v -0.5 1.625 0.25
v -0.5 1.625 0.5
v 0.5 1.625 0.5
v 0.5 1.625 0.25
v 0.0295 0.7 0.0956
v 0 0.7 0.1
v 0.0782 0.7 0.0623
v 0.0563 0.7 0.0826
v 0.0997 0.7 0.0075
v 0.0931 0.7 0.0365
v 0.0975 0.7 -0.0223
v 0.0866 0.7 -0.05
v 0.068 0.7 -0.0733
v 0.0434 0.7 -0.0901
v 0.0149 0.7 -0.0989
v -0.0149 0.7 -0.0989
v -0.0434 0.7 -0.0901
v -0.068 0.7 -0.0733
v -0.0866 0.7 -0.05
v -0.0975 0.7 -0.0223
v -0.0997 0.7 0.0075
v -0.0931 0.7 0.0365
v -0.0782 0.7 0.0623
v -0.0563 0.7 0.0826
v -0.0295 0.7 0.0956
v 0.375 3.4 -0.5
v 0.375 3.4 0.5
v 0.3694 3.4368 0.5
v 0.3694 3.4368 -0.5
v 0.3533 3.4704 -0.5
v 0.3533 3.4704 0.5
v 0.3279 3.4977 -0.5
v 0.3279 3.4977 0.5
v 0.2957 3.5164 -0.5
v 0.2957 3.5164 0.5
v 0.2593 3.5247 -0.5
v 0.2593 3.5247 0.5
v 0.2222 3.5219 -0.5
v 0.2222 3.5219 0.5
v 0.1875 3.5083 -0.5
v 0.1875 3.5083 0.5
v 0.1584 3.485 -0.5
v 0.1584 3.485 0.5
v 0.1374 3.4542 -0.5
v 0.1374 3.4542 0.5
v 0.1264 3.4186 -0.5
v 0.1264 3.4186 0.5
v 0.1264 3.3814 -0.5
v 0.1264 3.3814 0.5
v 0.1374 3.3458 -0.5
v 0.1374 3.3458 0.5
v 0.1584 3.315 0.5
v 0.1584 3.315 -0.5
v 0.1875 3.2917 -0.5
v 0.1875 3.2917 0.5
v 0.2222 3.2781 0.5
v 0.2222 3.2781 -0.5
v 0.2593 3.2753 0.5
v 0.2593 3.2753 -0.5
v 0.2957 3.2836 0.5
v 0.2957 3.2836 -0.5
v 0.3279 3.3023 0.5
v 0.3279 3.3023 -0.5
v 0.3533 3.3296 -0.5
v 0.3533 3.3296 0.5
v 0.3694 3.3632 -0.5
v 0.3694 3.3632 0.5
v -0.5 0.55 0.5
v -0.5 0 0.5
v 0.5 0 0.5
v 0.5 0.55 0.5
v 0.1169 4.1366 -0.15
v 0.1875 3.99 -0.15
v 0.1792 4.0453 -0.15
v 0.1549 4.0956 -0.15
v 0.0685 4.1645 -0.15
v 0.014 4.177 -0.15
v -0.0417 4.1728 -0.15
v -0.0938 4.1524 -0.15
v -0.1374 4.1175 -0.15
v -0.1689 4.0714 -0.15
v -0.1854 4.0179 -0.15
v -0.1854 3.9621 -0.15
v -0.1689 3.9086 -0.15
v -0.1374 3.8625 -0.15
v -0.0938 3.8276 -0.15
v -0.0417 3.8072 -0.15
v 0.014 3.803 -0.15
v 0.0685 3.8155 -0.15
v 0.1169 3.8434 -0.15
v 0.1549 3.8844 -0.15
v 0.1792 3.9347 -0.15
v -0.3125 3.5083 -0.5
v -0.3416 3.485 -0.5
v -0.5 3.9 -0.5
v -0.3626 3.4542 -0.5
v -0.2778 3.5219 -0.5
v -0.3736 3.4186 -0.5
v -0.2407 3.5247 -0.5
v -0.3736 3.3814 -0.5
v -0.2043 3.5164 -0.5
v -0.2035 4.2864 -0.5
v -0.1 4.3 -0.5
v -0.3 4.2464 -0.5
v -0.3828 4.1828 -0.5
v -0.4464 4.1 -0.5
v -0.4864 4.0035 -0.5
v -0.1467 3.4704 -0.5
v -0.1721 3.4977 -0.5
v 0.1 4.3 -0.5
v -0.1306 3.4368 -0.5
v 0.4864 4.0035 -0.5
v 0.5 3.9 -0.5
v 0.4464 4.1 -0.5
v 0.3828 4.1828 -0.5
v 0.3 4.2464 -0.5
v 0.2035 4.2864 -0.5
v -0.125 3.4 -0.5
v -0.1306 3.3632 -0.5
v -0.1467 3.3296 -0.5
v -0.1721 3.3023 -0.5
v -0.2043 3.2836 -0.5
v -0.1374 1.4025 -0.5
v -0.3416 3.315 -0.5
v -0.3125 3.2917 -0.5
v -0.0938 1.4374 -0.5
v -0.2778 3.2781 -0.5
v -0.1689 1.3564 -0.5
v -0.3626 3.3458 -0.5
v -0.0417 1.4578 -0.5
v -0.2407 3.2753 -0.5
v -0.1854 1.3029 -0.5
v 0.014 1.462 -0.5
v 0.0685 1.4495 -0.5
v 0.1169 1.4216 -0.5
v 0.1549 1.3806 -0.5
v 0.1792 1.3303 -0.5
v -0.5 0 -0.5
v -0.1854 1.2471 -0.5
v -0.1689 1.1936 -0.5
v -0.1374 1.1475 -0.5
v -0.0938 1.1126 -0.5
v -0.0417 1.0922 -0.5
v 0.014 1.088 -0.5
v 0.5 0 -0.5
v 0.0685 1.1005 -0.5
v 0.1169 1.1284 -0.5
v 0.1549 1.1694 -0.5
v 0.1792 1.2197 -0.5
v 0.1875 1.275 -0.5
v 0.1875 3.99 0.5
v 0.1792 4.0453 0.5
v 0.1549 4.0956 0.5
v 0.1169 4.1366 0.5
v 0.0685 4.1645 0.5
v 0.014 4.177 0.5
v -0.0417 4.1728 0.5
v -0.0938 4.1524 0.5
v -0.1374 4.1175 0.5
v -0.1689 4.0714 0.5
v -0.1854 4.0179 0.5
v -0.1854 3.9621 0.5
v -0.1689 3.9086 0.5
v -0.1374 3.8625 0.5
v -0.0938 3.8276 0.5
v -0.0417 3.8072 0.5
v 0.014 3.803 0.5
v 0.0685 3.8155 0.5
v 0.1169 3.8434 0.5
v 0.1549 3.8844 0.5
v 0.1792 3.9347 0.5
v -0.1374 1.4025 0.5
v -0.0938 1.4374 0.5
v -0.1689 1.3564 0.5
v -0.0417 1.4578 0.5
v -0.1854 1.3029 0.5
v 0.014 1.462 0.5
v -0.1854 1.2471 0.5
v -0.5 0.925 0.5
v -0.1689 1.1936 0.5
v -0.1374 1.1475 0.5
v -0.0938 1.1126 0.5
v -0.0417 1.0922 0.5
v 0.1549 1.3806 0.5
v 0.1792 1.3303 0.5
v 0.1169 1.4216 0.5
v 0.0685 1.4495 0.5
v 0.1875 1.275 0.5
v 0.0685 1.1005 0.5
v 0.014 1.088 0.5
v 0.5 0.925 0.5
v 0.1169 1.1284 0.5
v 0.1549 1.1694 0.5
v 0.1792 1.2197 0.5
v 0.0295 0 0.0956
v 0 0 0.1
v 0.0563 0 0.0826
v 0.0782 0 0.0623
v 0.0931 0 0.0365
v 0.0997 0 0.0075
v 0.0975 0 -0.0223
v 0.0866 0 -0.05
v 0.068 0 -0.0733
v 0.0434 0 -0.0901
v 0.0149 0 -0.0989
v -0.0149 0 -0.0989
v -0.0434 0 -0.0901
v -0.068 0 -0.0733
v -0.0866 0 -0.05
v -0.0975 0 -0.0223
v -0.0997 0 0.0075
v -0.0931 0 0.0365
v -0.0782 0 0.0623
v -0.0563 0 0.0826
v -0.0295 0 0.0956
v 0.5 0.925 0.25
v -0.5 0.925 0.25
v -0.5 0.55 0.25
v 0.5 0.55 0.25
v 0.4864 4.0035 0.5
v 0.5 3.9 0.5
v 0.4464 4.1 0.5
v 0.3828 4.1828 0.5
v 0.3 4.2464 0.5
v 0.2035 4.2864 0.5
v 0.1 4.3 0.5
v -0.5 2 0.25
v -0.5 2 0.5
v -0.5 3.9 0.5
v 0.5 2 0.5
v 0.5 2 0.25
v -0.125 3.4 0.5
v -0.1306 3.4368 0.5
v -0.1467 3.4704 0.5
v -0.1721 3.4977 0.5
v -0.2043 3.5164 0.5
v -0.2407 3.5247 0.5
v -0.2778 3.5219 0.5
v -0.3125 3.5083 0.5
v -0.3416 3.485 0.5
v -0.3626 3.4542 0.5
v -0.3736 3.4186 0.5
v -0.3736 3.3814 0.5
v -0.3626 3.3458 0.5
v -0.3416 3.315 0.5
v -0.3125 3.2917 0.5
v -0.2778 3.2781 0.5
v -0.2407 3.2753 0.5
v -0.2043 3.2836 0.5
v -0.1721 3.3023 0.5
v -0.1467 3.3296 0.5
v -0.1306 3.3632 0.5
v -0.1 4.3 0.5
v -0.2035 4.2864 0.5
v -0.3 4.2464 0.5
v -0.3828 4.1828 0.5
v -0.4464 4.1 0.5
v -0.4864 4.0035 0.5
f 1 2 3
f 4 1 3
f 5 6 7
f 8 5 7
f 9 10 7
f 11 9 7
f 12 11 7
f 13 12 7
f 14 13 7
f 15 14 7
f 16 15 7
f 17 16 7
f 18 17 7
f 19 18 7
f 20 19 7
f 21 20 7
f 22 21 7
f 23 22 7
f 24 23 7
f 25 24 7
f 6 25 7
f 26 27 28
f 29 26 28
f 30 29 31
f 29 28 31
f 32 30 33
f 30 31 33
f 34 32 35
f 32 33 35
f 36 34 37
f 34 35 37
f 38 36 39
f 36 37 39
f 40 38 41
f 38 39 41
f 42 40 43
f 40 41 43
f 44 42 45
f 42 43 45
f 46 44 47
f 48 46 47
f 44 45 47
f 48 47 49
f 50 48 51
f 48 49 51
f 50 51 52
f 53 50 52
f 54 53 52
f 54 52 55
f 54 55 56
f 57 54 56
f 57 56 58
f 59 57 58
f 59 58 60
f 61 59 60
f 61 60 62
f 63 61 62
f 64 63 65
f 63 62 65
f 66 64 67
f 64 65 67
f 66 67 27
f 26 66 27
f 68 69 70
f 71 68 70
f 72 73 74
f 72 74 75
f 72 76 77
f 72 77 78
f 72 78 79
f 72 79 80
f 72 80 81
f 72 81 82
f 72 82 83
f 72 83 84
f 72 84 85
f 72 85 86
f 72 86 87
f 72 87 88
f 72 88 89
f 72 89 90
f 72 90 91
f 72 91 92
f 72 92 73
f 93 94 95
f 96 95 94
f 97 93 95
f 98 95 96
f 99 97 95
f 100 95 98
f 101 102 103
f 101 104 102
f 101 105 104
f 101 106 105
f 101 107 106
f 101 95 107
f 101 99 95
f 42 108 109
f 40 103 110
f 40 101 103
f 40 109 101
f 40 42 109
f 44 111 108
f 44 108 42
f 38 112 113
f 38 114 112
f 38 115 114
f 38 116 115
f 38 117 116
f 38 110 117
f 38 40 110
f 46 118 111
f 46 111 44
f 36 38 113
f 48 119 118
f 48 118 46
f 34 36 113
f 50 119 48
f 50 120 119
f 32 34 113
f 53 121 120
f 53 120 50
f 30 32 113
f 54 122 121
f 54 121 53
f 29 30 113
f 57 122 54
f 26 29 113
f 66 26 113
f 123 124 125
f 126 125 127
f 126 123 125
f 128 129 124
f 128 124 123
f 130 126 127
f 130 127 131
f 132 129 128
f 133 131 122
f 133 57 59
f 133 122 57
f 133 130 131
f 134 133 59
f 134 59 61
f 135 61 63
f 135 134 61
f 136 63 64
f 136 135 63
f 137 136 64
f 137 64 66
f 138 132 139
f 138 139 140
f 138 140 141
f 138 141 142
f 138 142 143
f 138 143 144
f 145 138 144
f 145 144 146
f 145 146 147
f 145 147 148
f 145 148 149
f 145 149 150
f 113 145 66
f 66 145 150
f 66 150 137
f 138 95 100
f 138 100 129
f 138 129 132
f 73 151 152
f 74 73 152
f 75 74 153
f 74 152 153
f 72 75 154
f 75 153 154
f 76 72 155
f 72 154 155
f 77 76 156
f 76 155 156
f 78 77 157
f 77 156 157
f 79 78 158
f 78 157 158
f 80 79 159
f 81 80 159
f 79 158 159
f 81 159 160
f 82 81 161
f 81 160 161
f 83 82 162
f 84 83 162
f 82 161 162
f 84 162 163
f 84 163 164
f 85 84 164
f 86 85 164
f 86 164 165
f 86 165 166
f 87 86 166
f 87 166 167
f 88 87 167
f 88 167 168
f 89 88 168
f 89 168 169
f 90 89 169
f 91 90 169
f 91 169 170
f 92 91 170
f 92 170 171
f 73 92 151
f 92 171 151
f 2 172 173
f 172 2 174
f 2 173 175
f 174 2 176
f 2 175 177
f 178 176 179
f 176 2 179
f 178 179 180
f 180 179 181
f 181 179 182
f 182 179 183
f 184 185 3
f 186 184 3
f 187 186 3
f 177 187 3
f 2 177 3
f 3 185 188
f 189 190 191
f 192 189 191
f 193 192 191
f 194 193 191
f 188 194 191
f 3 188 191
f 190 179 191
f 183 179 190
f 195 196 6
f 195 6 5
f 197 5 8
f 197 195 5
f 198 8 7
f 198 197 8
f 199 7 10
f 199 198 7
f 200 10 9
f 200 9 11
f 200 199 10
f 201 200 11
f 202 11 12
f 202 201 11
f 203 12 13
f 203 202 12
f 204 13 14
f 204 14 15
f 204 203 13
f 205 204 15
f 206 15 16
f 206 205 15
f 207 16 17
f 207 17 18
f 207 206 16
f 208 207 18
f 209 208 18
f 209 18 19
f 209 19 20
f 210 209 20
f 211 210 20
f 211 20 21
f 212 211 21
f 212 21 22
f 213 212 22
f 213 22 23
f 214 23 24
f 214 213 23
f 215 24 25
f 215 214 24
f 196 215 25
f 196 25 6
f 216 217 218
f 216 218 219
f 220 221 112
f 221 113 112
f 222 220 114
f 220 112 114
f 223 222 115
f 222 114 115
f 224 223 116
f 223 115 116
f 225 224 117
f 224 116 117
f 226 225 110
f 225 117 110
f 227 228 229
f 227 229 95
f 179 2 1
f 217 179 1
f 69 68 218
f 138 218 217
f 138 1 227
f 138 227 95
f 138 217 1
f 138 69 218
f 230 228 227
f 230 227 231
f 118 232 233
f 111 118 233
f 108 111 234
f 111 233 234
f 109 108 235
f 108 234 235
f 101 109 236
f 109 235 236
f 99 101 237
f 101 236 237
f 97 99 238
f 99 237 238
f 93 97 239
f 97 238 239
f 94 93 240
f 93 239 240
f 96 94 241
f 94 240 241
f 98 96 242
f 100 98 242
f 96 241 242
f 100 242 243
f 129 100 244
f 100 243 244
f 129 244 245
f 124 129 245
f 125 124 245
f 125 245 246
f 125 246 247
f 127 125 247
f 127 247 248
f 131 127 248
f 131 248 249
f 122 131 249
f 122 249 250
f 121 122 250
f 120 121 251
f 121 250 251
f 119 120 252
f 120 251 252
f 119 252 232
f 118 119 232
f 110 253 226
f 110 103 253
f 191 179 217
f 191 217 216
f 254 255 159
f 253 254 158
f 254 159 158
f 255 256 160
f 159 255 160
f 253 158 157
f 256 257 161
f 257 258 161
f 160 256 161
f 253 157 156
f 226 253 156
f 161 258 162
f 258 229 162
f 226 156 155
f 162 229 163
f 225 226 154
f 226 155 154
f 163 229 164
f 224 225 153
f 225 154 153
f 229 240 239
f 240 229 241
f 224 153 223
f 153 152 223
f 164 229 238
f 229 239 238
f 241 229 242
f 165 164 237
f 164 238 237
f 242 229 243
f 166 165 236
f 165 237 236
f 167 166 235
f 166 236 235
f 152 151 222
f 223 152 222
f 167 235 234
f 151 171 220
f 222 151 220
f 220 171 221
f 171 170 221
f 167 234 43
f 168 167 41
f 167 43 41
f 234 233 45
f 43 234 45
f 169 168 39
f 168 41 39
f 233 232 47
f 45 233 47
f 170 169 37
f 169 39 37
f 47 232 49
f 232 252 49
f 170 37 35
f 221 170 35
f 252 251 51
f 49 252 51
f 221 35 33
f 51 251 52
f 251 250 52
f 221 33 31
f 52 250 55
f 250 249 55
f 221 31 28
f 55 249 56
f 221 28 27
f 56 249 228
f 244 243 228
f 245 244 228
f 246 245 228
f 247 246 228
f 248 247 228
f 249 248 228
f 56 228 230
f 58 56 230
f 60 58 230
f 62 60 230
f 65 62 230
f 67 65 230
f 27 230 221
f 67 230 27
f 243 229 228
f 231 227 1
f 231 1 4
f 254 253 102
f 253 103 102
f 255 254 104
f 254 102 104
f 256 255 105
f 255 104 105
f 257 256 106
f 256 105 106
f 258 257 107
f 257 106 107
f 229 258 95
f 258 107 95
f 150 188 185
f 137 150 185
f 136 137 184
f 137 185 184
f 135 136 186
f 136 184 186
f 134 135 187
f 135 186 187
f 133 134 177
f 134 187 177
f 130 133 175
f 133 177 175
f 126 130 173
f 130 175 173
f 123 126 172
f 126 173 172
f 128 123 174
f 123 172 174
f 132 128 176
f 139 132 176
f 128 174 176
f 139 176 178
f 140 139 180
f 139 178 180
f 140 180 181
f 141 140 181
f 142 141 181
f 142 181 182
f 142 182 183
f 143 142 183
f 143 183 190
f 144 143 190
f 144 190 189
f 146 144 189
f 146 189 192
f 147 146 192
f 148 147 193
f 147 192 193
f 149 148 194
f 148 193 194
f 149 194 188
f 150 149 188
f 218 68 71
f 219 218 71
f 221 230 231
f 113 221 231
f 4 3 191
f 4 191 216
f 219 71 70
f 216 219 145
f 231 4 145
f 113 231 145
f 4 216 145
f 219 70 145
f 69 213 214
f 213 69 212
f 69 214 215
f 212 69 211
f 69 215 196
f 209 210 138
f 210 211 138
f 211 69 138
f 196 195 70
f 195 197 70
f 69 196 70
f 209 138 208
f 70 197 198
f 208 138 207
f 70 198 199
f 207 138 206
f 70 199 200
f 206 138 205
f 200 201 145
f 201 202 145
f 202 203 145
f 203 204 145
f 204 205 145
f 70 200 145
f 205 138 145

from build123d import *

# Parameters (mm, degrees)
SKETCH1_W           = 1
SKETCH1_H           = 1
BOSS_EXTRUDE1_DEPTH = 4.3
FILLET1_R           = 0.4
FILLET2_R           = 0.4
SKETCH2_R           = 0.1
CUT_EXTRUDE1_DEPTH  = 0.7
SKETCH6_W           = 1
SKETCH6_H           = 0.375
CUT_EXTRUDE2_DEPTH  = 0.25
SKETCH8_W           = 1
SKETCH8_H           = 0.375
CUT_EXTRUDE3_DEPTH  = 0.25
SKETCH9_R           = 0.1875
CUT_EXTRUDE4_DEPTH  = 1
SKETCH10_R          = 0.1875
CUT_EXTRUDE5_DEPTH  = 0.65
SKETCH11_R          = 0.125
CUT_EXTRUDE6_DEPTH  = 1


with BuildPart() as part:
    # Sketch1 → Boss-Extrude1 (new body)
    with BuildSketch(Plane(origin=(0, 0, 0), x_dir=(1, 0, 0), z_dir=(0, 1, 0))):
        Rectangle(SKETCH1_W, SKETCH1_H)
    extrude(amount=BOSS_EXTRUDE1_DEPTH)

    # Fillet1
    fillet1_edges = [part.edges().sort_by_distance(p)[0] for p in [
        (0.5, 4.3, 0),
    ]]
    fillet(fillet1_edges, radius=FILLET1_R)

    # Fillet2
    fillet2_edges = [part.edges().sort_by_distance(p)[0] for p in [
        (-0.5, 4.3, 0),
    ]]
    fillet(fillet2_edges, radius=FILLET2_R)

    # Sketch2 → Cut-Extrude1 (cut)
    with BuildSketch(Plane(origin=(0, 0, 0), x_dir=(1, 0, 0), z_dir=(0, 1, 0))):
        with Locations(Location((0, 0, 0), (0, 0, 270))):
            Circle(SKETCH2_R)
    extrude(amount=CUT_EXTRUDE1_DEPTH, mode=Mode.SUBTRACT)

    # Sketch6 → Cut-Extrude2 (cut)
    with BuildSketch(Plane.XY.offset(0.5)):
        with Locations((0, 0.7375)):
            Rectangle(SKETCH6_W, SKETCH6_H)
    extrude(amount=-CUT_EXTRUDE2_DEPTH, mode=Mode.SUBTRACT)

    # Sketch8 → Cut-Extrude3 (cut)
    with BuildSketch(Plane.XY.offset(0.5)):
        with Locations((0, 1.8125)):
            Rectangle(SKETCH8_W, SKETCH8_H)
    extrude(amount=-CUT_EXTRUDE3_DEPTH, mode=Mode.SUBTRACT)

    # Sketch9 → Cut-Extrude4 (cut)
    with BuildSketch(Plane.XY.offset(0.5)):
        with Locations((0, 1.275)):
            Circle(SKETCH9_R)
    extrude(amount=-CUT_EXTRUDE4_DEPTH, mode=Mode.SUBTRACT)

    # Sketch10 → Cut-Extrude5 (cut)
    with BuildSketch(Plane.XY.offset(0.5)):
        with Locations((0, 3.99)):
            Circle(SKETCH10_R)
    extrude(amount=-CUT_EXTRUDE5_DEPTH, mode=Mode.SUBTRACT)

    # Sketch11 → Cut-Extrude6 (cut)
    with BuildSketch(Plane.XY.offset(0.5)):
        with Locations((0.25, 3.4)):
            Circle(SKETCH11_R)
        with Locations((-0.25, 3.4)):
            Circle(SKETCH11_R)
    extrude(amount=-CUT_EXTRUDE6_DEPTH, mode=Mode.SUBTRACT)


solid = part.part
